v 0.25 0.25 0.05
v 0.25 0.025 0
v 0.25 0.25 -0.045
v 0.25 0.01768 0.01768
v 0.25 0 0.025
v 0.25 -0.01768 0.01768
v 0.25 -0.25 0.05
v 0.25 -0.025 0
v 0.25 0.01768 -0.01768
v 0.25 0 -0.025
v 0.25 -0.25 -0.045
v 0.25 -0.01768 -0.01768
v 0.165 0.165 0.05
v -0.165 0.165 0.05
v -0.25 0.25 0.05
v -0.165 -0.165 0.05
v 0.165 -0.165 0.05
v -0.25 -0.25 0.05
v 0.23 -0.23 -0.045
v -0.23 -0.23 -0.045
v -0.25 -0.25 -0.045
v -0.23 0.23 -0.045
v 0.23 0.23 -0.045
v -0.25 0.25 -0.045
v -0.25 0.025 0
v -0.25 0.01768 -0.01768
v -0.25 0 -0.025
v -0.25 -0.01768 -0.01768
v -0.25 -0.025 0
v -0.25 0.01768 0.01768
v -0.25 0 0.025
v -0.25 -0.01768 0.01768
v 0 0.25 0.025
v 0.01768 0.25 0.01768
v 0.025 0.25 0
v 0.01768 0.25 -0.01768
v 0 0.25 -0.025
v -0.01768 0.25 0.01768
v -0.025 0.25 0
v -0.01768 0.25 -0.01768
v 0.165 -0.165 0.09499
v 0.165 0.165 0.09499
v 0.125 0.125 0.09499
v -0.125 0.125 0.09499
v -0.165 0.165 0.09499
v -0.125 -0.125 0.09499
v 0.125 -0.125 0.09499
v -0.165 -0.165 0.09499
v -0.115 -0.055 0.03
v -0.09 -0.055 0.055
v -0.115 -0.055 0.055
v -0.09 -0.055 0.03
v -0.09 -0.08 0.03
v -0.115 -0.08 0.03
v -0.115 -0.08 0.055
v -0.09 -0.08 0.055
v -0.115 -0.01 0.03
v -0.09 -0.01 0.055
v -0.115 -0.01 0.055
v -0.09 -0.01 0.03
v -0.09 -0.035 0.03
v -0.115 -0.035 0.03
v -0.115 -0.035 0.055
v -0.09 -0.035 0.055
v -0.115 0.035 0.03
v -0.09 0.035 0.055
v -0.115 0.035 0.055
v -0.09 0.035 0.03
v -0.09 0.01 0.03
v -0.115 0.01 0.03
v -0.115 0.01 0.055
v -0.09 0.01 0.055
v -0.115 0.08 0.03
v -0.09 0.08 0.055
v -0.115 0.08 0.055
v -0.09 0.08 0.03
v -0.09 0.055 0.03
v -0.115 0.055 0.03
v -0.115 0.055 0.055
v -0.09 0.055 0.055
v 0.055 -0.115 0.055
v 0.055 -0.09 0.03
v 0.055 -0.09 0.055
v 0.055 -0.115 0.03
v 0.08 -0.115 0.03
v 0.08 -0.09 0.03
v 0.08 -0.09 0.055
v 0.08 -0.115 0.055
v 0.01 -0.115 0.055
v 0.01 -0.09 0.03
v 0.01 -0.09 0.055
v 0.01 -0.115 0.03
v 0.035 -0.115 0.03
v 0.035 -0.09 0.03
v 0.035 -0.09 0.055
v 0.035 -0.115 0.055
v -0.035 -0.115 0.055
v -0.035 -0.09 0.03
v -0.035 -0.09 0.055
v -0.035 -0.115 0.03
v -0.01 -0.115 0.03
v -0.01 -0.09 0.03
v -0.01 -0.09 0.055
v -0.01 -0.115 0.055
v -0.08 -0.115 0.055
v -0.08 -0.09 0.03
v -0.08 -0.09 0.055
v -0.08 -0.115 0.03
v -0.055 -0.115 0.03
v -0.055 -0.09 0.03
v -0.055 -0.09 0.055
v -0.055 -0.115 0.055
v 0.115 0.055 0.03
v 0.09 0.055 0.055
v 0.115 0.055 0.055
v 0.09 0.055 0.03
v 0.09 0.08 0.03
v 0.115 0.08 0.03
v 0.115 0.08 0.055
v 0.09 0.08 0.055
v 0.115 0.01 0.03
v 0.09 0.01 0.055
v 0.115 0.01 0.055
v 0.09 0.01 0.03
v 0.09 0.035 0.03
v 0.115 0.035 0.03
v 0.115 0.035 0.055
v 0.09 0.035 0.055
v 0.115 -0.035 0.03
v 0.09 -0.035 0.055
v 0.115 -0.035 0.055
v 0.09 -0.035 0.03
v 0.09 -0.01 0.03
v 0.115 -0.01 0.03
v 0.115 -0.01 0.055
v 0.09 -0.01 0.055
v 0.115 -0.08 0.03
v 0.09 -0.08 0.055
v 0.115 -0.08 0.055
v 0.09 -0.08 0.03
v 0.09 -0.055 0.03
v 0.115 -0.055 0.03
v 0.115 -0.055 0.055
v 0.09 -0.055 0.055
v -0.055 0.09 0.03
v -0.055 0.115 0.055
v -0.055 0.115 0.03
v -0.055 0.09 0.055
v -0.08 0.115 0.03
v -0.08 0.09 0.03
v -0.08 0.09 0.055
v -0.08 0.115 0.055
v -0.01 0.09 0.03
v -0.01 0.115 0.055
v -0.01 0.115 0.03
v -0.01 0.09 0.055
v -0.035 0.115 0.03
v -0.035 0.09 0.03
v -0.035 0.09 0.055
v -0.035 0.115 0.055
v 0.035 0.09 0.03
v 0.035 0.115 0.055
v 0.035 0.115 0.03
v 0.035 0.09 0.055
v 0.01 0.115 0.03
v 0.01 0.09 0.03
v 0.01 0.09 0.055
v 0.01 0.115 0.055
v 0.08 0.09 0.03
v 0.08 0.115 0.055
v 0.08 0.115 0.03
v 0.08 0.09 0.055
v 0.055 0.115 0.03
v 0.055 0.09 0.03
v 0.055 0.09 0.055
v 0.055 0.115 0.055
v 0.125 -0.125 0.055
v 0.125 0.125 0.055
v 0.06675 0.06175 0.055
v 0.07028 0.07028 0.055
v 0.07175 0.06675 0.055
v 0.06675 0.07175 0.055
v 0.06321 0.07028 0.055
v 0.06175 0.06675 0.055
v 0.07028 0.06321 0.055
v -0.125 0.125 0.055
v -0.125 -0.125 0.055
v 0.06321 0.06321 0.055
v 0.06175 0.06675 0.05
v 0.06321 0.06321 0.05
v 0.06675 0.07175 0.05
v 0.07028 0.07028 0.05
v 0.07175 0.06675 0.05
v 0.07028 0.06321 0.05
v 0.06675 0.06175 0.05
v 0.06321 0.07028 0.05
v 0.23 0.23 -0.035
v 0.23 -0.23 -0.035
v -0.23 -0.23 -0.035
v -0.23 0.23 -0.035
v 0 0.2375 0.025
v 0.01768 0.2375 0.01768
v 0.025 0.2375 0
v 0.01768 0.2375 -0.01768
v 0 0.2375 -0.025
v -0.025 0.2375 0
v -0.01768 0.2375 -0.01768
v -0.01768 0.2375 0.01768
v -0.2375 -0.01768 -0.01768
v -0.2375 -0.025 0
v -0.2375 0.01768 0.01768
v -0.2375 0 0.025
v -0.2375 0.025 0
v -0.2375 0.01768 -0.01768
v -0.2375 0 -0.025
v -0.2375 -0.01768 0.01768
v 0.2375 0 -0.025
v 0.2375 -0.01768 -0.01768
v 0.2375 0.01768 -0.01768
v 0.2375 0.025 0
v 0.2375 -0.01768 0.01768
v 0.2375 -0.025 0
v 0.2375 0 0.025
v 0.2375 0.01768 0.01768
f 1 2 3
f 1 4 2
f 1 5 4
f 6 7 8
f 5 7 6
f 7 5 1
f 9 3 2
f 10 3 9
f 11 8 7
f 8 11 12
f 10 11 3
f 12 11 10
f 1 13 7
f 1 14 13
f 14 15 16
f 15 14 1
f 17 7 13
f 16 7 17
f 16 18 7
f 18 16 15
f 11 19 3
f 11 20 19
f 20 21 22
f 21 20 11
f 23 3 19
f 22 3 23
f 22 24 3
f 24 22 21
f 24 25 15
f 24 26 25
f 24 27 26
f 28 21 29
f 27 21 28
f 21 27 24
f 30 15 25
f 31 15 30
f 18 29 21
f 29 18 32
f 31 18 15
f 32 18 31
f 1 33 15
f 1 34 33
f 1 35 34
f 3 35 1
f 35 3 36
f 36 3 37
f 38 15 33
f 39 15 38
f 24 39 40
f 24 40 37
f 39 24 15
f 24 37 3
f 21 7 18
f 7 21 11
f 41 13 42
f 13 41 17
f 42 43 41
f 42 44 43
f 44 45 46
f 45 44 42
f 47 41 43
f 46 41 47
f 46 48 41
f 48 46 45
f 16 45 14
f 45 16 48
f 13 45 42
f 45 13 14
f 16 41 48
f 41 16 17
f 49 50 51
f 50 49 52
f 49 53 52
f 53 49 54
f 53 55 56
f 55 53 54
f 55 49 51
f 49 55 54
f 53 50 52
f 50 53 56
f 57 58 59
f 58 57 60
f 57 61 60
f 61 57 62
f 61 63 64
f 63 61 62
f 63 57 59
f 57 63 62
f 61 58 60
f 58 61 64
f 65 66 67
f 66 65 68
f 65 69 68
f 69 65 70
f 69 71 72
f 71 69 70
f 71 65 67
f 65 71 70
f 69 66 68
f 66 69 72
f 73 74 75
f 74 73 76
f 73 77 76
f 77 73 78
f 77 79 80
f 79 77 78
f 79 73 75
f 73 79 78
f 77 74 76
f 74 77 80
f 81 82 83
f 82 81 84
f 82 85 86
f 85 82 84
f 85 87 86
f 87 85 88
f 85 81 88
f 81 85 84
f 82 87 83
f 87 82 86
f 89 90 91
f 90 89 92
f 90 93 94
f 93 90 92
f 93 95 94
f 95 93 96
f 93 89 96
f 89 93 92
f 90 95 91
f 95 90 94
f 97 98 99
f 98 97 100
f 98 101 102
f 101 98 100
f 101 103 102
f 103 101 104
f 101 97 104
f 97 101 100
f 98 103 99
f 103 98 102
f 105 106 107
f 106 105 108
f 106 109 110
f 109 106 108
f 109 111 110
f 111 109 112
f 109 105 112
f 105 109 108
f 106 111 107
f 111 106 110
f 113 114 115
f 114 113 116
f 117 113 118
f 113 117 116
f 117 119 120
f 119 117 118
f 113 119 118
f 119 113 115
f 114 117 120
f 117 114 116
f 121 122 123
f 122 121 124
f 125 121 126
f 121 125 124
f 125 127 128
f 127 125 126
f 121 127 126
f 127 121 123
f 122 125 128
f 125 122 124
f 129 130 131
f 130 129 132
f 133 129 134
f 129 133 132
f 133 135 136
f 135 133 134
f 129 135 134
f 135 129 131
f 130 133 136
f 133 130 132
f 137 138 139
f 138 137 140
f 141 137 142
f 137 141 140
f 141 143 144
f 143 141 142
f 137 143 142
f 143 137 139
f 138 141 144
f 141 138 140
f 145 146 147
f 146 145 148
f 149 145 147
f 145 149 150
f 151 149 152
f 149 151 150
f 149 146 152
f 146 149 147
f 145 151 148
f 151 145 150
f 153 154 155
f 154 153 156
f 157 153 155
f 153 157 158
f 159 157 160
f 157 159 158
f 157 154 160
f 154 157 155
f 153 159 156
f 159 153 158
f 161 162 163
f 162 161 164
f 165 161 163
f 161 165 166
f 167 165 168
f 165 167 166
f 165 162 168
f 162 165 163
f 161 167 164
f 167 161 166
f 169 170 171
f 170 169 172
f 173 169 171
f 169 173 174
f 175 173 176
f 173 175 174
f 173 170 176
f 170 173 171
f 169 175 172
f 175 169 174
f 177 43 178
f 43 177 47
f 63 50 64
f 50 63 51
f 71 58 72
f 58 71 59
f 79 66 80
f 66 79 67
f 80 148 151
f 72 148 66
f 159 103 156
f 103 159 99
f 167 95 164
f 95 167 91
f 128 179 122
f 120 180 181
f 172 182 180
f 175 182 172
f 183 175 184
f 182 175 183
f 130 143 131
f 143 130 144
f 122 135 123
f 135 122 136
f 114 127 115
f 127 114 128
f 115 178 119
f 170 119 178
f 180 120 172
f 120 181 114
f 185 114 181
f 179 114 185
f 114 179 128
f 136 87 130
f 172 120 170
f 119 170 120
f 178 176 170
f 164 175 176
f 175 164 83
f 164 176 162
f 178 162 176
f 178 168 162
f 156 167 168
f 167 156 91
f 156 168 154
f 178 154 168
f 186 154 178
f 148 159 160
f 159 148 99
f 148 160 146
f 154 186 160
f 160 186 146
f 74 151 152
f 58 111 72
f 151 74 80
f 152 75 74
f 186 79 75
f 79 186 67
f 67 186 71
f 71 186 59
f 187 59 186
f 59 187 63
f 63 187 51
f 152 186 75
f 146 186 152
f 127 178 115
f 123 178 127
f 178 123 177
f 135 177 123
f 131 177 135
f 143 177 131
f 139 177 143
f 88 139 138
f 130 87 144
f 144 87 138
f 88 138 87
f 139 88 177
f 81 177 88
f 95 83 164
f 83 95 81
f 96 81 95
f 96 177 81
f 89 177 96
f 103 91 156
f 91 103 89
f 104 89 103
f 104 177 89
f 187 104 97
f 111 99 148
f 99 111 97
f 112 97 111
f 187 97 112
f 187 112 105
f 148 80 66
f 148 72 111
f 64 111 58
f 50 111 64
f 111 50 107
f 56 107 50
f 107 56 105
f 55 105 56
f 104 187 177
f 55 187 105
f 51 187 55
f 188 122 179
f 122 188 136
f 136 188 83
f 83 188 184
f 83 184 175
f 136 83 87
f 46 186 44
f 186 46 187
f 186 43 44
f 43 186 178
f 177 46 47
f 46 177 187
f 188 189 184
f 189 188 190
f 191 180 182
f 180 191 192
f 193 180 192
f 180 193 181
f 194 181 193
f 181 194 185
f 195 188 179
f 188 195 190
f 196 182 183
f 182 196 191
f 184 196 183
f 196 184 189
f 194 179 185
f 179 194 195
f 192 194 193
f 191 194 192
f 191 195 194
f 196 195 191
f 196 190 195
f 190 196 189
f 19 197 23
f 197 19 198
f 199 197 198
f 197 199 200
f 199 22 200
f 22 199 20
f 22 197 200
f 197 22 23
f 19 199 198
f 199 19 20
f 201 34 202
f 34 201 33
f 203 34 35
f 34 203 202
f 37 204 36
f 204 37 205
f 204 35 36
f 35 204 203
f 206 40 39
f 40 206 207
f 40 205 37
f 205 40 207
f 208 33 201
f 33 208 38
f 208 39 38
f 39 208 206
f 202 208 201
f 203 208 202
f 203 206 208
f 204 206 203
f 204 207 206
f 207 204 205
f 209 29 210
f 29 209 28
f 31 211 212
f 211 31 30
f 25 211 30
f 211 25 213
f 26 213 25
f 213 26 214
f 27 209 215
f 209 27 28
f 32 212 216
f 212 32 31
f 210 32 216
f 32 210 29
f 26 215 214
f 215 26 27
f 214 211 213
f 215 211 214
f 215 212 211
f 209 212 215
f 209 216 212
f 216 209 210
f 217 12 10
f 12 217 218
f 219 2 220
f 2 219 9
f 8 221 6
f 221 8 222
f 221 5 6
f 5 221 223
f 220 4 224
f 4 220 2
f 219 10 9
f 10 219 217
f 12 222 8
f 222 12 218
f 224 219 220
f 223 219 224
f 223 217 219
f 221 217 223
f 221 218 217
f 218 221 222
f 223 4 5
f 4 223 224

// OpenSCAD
// file: DataSymbol.scad
boxSize = 0.029;
lineSize = 0.0045;
symDepth = 0.01;
vertSeparation = 0.019;
horizSeparation = 0.018;

module DataSymbol() {
  boxVertCenter = (boxSize+vertSeparation)/2;
  boxHorizCenter = (boxSize+horizSeparation)/2;
  linear_extrude(symDepth, center=true) {
    translate([0,boxVertCenter]) square(boxSize, center=true); // top box
    translate([-boxHorizCenter,-boxVertCenter]) square(boxSize, center=true); // bottom left box
    translate([boxHorizCenter,-boxVertCenter]) square(boxSize, center=true); // bottom right box
    square([2*boxHorizCenter + lineSize, lineSize], center=true); // middle line
    translate([0, horizSeparation/4]) square([lineSize, horizSeparation/2 + lineSize], center=true); // line to top
    translate([-boxHorizCenter, -horizSeparation/4]) square([lineSize, horizSeparation/2 + lineSize], center=true); // line to bottom left
    translate([boxHorizCenter, -horizSeparation/4]) square([lineSize, horizSeparation/2 + lineSize], center=true); // line to bottom right
  }
}

DataSymbol();
// file: PowerSymbol.scad
symWidth = 0.038;
symHeight = 0.086;
symDepth = 0.01;
middleHeight = 0.0075;
topHorizOffset = 0.007;
sideVertOffset = 0.007;

module PowerSymbol() {
  linear_extrude(symDepth, center=true) {
    halfHei = symHeight/2;
    halfWid = symWidth/2;
    halfMid = middleHeight/2;
    polygon([
      [topHorizOffset, halfHei],
      [0, halfMid],
      [halfWid, sideVertOffset],
      [-topHorizOffset, -halfHei],
      [0, -halfMid],
      [-halfWid, -sideVertOffset]
    ]);
  }
}

PowerSymbol();
// file: FPGAHousing_paintcap.scad
include <FPGA_shared.scad>;
use <FPGAHousing_base.scad>;

module FPGAHousing_paintcap() {
  bevelDepth = capBevel * sqrt(2);
  difference() {
    translate([0,0,baseTop]) {
      cube(size=[capSize, capSize, capDepth*2], center=true);
    }
    cube(size=[slotSize+eps*10, slotSize+eps*10, smallGridSize], center=true);
    for (edge=[1:4]) rotate([0,0,90*edge]) {
      translate([0,capSize/2,baseTop+capDepth]) rotate([45,0,0])
        cube(size=[capSize+0.1, bevelDepth, bevelDepth*2], center=true);
    }
  }
}

%FPGAHousing_base();
FPGAHousing_paintcap();
// file: FPGAHousing_base.scad
include <FPGA_shared.scad>;
use <FPGAHousing_paintcap.scad>;
use <PowerSymbol.scad>;
use <DataSymbol.scad>;

module FPGAHousing_chipcutout() {
  slotPinBaseOffset = (-slotPinEdgeCount-1)/2 * slotPinEdgeSpacing;
  slotPinEdgeOffset = slotSize/2 - slotPinSize/2 - slotPinEdgePad;
  union() {
    translate([0, 0, baseDepth/2 + slotBottom + slotPinDepth]) {
      cube(size=[slotSize, slotSize, baseDepth], center=true);
    }
    for(edge=[1:4]) rotate([0,0,90*edge]) {
      for(i=[1:slotPinEdgeCount]) {
        translate([
          slotPinBaseOffset + slotPinEdgeSpacing*i,
          slotPinEdgeOffset,
          slotBottom + slotPinDepth
        ]) {
          cube(size=[slotPinSize, slotPinSize, slotPinDepth*2], center=true);
        }
      }
    }
    translate([alignHoleOffset,alignHoleOffset,slotBottom + slotPinDepth])
      cylinder(h=alignHoleDepth*2, r=alignHoleRadius, center=true, $fn=alignHoleSides);
  }
}

module FPGAHousing_base() {
  middleSize = (slotSize + capSize) / 2;
  difference() {
    union() {
      translate([0,0,baseCenter])
        cube(size=[baseSize, baseSize, baseDepth], center=true);
      translate([0,0,baseTop-eps])
        cube(size=[middleSize, middleSize, capDepth*2], center=true);
    }
    translate([0,0,baseBottom])
      cube(size=[baseBackCutoutSize, baseBackCutoutSize, baseBackCutoutDepth*2], center=true);
    FPGAHousing_chipcutout();
  }
}

FPGAHousing_base();
%FPGAHousing_paintcap();
// file: FPGA_shared.scad
smallGridSize = 0.5;
baseSize = smallGridSize;
baseTop = 0.05;
baseBottom = -0.045;
baseDepth = baseTop - baseBottom;
baseCenter = (baseTop + baseBottom)/2;
baseBackRim = 0.02;
baseBackCutoutSize = baseSize - baseBackRim*2;
baseBackCutoutDepth = 0.01;
capSize = 0.41;
capDepth = 0.045;
capBevel = 0.01;
slotSize = smallGridSize * 0.5;
slotBottom = 0.03;
slotPinEdgeCount = 4;
slotPinEdgePad = 0.01;
slotPinEdgeSpacing = 0.045;
slotPinSize = 0.025;
slotPinDepth = 0.025;
eps = 0.00001;
chipTotalSize = slotSize - slotPinEdgePad*2 - slotPinSize/2;
chipTotalHeight = 0.1;
chipBaseHeight = 0.05;
pinHorizLength = 0.022;
pinHorizUnderLength = 0.008;
pinHorizWidth = 0.02;
pinHorizHeight = 0.015;
pinVertInnerOffset = 0.003;
pinVertOuterOffset = 0.003;
pinVertNarrowOffset = 0.003;
pinTotalHeight = chipTotalHeight - chipBaseHeight/2 + pinHorizHeight/2;
chipBaseSize = chipTotalSize - pinHorizLength*2;
chipBaseBevelSize = 0.005;
alignHoleRadius = 0.005;
alignHoleOffset = chipBaseSize/2 - 0.02;
alignHoleDepth = 0.005;
alignHoleSides = 8;
decoPinCount = 8;
decoPinWidth = 0.036;
decoPinLength = 0.034;
decoPinHeight = 0.028;
decoPinSpacing = 0.049;
decoPinBevelSize = 0.010;

module cablecutout() {
  cableradius = 0.025;
  cableDepth = 0.0125;
  translate([0,smallGridSize/2,0]) rotate([90,0,0]) {
    cylinder(h=cableDepth*2, r=cableradius, center=true, $fn=8);
  }
}
// main file
include <FPGA_shared.scad>;
use <FPGAHousing_base.scad>;
use <FPGAHousing_paintcap.scad>;
use <PowerSymbol.scad>;
use <DataSymbol.scad>;

module FPGAHousing_readerbase() {
  difference() {
    FPGAHousing_base();
    cablecutout();
    rotate([0,0,90]) cablecutout();
    rotate([0,0,-90]) cablecutout();
  }
}

FPGAHousing_readerbase();
%FPGAHousing_paintcap();
%translate([0.067,0.25,-0.001]) rotate([-90, 0, 0]) PowerSymbol();
%translate([-0.25,0.073,0.001]) rotate([90, 0, 90]) DataSymbol();
%translate([0.25,0.073,0.001]) rotate([90, 0, -90]) DataSymbol();
